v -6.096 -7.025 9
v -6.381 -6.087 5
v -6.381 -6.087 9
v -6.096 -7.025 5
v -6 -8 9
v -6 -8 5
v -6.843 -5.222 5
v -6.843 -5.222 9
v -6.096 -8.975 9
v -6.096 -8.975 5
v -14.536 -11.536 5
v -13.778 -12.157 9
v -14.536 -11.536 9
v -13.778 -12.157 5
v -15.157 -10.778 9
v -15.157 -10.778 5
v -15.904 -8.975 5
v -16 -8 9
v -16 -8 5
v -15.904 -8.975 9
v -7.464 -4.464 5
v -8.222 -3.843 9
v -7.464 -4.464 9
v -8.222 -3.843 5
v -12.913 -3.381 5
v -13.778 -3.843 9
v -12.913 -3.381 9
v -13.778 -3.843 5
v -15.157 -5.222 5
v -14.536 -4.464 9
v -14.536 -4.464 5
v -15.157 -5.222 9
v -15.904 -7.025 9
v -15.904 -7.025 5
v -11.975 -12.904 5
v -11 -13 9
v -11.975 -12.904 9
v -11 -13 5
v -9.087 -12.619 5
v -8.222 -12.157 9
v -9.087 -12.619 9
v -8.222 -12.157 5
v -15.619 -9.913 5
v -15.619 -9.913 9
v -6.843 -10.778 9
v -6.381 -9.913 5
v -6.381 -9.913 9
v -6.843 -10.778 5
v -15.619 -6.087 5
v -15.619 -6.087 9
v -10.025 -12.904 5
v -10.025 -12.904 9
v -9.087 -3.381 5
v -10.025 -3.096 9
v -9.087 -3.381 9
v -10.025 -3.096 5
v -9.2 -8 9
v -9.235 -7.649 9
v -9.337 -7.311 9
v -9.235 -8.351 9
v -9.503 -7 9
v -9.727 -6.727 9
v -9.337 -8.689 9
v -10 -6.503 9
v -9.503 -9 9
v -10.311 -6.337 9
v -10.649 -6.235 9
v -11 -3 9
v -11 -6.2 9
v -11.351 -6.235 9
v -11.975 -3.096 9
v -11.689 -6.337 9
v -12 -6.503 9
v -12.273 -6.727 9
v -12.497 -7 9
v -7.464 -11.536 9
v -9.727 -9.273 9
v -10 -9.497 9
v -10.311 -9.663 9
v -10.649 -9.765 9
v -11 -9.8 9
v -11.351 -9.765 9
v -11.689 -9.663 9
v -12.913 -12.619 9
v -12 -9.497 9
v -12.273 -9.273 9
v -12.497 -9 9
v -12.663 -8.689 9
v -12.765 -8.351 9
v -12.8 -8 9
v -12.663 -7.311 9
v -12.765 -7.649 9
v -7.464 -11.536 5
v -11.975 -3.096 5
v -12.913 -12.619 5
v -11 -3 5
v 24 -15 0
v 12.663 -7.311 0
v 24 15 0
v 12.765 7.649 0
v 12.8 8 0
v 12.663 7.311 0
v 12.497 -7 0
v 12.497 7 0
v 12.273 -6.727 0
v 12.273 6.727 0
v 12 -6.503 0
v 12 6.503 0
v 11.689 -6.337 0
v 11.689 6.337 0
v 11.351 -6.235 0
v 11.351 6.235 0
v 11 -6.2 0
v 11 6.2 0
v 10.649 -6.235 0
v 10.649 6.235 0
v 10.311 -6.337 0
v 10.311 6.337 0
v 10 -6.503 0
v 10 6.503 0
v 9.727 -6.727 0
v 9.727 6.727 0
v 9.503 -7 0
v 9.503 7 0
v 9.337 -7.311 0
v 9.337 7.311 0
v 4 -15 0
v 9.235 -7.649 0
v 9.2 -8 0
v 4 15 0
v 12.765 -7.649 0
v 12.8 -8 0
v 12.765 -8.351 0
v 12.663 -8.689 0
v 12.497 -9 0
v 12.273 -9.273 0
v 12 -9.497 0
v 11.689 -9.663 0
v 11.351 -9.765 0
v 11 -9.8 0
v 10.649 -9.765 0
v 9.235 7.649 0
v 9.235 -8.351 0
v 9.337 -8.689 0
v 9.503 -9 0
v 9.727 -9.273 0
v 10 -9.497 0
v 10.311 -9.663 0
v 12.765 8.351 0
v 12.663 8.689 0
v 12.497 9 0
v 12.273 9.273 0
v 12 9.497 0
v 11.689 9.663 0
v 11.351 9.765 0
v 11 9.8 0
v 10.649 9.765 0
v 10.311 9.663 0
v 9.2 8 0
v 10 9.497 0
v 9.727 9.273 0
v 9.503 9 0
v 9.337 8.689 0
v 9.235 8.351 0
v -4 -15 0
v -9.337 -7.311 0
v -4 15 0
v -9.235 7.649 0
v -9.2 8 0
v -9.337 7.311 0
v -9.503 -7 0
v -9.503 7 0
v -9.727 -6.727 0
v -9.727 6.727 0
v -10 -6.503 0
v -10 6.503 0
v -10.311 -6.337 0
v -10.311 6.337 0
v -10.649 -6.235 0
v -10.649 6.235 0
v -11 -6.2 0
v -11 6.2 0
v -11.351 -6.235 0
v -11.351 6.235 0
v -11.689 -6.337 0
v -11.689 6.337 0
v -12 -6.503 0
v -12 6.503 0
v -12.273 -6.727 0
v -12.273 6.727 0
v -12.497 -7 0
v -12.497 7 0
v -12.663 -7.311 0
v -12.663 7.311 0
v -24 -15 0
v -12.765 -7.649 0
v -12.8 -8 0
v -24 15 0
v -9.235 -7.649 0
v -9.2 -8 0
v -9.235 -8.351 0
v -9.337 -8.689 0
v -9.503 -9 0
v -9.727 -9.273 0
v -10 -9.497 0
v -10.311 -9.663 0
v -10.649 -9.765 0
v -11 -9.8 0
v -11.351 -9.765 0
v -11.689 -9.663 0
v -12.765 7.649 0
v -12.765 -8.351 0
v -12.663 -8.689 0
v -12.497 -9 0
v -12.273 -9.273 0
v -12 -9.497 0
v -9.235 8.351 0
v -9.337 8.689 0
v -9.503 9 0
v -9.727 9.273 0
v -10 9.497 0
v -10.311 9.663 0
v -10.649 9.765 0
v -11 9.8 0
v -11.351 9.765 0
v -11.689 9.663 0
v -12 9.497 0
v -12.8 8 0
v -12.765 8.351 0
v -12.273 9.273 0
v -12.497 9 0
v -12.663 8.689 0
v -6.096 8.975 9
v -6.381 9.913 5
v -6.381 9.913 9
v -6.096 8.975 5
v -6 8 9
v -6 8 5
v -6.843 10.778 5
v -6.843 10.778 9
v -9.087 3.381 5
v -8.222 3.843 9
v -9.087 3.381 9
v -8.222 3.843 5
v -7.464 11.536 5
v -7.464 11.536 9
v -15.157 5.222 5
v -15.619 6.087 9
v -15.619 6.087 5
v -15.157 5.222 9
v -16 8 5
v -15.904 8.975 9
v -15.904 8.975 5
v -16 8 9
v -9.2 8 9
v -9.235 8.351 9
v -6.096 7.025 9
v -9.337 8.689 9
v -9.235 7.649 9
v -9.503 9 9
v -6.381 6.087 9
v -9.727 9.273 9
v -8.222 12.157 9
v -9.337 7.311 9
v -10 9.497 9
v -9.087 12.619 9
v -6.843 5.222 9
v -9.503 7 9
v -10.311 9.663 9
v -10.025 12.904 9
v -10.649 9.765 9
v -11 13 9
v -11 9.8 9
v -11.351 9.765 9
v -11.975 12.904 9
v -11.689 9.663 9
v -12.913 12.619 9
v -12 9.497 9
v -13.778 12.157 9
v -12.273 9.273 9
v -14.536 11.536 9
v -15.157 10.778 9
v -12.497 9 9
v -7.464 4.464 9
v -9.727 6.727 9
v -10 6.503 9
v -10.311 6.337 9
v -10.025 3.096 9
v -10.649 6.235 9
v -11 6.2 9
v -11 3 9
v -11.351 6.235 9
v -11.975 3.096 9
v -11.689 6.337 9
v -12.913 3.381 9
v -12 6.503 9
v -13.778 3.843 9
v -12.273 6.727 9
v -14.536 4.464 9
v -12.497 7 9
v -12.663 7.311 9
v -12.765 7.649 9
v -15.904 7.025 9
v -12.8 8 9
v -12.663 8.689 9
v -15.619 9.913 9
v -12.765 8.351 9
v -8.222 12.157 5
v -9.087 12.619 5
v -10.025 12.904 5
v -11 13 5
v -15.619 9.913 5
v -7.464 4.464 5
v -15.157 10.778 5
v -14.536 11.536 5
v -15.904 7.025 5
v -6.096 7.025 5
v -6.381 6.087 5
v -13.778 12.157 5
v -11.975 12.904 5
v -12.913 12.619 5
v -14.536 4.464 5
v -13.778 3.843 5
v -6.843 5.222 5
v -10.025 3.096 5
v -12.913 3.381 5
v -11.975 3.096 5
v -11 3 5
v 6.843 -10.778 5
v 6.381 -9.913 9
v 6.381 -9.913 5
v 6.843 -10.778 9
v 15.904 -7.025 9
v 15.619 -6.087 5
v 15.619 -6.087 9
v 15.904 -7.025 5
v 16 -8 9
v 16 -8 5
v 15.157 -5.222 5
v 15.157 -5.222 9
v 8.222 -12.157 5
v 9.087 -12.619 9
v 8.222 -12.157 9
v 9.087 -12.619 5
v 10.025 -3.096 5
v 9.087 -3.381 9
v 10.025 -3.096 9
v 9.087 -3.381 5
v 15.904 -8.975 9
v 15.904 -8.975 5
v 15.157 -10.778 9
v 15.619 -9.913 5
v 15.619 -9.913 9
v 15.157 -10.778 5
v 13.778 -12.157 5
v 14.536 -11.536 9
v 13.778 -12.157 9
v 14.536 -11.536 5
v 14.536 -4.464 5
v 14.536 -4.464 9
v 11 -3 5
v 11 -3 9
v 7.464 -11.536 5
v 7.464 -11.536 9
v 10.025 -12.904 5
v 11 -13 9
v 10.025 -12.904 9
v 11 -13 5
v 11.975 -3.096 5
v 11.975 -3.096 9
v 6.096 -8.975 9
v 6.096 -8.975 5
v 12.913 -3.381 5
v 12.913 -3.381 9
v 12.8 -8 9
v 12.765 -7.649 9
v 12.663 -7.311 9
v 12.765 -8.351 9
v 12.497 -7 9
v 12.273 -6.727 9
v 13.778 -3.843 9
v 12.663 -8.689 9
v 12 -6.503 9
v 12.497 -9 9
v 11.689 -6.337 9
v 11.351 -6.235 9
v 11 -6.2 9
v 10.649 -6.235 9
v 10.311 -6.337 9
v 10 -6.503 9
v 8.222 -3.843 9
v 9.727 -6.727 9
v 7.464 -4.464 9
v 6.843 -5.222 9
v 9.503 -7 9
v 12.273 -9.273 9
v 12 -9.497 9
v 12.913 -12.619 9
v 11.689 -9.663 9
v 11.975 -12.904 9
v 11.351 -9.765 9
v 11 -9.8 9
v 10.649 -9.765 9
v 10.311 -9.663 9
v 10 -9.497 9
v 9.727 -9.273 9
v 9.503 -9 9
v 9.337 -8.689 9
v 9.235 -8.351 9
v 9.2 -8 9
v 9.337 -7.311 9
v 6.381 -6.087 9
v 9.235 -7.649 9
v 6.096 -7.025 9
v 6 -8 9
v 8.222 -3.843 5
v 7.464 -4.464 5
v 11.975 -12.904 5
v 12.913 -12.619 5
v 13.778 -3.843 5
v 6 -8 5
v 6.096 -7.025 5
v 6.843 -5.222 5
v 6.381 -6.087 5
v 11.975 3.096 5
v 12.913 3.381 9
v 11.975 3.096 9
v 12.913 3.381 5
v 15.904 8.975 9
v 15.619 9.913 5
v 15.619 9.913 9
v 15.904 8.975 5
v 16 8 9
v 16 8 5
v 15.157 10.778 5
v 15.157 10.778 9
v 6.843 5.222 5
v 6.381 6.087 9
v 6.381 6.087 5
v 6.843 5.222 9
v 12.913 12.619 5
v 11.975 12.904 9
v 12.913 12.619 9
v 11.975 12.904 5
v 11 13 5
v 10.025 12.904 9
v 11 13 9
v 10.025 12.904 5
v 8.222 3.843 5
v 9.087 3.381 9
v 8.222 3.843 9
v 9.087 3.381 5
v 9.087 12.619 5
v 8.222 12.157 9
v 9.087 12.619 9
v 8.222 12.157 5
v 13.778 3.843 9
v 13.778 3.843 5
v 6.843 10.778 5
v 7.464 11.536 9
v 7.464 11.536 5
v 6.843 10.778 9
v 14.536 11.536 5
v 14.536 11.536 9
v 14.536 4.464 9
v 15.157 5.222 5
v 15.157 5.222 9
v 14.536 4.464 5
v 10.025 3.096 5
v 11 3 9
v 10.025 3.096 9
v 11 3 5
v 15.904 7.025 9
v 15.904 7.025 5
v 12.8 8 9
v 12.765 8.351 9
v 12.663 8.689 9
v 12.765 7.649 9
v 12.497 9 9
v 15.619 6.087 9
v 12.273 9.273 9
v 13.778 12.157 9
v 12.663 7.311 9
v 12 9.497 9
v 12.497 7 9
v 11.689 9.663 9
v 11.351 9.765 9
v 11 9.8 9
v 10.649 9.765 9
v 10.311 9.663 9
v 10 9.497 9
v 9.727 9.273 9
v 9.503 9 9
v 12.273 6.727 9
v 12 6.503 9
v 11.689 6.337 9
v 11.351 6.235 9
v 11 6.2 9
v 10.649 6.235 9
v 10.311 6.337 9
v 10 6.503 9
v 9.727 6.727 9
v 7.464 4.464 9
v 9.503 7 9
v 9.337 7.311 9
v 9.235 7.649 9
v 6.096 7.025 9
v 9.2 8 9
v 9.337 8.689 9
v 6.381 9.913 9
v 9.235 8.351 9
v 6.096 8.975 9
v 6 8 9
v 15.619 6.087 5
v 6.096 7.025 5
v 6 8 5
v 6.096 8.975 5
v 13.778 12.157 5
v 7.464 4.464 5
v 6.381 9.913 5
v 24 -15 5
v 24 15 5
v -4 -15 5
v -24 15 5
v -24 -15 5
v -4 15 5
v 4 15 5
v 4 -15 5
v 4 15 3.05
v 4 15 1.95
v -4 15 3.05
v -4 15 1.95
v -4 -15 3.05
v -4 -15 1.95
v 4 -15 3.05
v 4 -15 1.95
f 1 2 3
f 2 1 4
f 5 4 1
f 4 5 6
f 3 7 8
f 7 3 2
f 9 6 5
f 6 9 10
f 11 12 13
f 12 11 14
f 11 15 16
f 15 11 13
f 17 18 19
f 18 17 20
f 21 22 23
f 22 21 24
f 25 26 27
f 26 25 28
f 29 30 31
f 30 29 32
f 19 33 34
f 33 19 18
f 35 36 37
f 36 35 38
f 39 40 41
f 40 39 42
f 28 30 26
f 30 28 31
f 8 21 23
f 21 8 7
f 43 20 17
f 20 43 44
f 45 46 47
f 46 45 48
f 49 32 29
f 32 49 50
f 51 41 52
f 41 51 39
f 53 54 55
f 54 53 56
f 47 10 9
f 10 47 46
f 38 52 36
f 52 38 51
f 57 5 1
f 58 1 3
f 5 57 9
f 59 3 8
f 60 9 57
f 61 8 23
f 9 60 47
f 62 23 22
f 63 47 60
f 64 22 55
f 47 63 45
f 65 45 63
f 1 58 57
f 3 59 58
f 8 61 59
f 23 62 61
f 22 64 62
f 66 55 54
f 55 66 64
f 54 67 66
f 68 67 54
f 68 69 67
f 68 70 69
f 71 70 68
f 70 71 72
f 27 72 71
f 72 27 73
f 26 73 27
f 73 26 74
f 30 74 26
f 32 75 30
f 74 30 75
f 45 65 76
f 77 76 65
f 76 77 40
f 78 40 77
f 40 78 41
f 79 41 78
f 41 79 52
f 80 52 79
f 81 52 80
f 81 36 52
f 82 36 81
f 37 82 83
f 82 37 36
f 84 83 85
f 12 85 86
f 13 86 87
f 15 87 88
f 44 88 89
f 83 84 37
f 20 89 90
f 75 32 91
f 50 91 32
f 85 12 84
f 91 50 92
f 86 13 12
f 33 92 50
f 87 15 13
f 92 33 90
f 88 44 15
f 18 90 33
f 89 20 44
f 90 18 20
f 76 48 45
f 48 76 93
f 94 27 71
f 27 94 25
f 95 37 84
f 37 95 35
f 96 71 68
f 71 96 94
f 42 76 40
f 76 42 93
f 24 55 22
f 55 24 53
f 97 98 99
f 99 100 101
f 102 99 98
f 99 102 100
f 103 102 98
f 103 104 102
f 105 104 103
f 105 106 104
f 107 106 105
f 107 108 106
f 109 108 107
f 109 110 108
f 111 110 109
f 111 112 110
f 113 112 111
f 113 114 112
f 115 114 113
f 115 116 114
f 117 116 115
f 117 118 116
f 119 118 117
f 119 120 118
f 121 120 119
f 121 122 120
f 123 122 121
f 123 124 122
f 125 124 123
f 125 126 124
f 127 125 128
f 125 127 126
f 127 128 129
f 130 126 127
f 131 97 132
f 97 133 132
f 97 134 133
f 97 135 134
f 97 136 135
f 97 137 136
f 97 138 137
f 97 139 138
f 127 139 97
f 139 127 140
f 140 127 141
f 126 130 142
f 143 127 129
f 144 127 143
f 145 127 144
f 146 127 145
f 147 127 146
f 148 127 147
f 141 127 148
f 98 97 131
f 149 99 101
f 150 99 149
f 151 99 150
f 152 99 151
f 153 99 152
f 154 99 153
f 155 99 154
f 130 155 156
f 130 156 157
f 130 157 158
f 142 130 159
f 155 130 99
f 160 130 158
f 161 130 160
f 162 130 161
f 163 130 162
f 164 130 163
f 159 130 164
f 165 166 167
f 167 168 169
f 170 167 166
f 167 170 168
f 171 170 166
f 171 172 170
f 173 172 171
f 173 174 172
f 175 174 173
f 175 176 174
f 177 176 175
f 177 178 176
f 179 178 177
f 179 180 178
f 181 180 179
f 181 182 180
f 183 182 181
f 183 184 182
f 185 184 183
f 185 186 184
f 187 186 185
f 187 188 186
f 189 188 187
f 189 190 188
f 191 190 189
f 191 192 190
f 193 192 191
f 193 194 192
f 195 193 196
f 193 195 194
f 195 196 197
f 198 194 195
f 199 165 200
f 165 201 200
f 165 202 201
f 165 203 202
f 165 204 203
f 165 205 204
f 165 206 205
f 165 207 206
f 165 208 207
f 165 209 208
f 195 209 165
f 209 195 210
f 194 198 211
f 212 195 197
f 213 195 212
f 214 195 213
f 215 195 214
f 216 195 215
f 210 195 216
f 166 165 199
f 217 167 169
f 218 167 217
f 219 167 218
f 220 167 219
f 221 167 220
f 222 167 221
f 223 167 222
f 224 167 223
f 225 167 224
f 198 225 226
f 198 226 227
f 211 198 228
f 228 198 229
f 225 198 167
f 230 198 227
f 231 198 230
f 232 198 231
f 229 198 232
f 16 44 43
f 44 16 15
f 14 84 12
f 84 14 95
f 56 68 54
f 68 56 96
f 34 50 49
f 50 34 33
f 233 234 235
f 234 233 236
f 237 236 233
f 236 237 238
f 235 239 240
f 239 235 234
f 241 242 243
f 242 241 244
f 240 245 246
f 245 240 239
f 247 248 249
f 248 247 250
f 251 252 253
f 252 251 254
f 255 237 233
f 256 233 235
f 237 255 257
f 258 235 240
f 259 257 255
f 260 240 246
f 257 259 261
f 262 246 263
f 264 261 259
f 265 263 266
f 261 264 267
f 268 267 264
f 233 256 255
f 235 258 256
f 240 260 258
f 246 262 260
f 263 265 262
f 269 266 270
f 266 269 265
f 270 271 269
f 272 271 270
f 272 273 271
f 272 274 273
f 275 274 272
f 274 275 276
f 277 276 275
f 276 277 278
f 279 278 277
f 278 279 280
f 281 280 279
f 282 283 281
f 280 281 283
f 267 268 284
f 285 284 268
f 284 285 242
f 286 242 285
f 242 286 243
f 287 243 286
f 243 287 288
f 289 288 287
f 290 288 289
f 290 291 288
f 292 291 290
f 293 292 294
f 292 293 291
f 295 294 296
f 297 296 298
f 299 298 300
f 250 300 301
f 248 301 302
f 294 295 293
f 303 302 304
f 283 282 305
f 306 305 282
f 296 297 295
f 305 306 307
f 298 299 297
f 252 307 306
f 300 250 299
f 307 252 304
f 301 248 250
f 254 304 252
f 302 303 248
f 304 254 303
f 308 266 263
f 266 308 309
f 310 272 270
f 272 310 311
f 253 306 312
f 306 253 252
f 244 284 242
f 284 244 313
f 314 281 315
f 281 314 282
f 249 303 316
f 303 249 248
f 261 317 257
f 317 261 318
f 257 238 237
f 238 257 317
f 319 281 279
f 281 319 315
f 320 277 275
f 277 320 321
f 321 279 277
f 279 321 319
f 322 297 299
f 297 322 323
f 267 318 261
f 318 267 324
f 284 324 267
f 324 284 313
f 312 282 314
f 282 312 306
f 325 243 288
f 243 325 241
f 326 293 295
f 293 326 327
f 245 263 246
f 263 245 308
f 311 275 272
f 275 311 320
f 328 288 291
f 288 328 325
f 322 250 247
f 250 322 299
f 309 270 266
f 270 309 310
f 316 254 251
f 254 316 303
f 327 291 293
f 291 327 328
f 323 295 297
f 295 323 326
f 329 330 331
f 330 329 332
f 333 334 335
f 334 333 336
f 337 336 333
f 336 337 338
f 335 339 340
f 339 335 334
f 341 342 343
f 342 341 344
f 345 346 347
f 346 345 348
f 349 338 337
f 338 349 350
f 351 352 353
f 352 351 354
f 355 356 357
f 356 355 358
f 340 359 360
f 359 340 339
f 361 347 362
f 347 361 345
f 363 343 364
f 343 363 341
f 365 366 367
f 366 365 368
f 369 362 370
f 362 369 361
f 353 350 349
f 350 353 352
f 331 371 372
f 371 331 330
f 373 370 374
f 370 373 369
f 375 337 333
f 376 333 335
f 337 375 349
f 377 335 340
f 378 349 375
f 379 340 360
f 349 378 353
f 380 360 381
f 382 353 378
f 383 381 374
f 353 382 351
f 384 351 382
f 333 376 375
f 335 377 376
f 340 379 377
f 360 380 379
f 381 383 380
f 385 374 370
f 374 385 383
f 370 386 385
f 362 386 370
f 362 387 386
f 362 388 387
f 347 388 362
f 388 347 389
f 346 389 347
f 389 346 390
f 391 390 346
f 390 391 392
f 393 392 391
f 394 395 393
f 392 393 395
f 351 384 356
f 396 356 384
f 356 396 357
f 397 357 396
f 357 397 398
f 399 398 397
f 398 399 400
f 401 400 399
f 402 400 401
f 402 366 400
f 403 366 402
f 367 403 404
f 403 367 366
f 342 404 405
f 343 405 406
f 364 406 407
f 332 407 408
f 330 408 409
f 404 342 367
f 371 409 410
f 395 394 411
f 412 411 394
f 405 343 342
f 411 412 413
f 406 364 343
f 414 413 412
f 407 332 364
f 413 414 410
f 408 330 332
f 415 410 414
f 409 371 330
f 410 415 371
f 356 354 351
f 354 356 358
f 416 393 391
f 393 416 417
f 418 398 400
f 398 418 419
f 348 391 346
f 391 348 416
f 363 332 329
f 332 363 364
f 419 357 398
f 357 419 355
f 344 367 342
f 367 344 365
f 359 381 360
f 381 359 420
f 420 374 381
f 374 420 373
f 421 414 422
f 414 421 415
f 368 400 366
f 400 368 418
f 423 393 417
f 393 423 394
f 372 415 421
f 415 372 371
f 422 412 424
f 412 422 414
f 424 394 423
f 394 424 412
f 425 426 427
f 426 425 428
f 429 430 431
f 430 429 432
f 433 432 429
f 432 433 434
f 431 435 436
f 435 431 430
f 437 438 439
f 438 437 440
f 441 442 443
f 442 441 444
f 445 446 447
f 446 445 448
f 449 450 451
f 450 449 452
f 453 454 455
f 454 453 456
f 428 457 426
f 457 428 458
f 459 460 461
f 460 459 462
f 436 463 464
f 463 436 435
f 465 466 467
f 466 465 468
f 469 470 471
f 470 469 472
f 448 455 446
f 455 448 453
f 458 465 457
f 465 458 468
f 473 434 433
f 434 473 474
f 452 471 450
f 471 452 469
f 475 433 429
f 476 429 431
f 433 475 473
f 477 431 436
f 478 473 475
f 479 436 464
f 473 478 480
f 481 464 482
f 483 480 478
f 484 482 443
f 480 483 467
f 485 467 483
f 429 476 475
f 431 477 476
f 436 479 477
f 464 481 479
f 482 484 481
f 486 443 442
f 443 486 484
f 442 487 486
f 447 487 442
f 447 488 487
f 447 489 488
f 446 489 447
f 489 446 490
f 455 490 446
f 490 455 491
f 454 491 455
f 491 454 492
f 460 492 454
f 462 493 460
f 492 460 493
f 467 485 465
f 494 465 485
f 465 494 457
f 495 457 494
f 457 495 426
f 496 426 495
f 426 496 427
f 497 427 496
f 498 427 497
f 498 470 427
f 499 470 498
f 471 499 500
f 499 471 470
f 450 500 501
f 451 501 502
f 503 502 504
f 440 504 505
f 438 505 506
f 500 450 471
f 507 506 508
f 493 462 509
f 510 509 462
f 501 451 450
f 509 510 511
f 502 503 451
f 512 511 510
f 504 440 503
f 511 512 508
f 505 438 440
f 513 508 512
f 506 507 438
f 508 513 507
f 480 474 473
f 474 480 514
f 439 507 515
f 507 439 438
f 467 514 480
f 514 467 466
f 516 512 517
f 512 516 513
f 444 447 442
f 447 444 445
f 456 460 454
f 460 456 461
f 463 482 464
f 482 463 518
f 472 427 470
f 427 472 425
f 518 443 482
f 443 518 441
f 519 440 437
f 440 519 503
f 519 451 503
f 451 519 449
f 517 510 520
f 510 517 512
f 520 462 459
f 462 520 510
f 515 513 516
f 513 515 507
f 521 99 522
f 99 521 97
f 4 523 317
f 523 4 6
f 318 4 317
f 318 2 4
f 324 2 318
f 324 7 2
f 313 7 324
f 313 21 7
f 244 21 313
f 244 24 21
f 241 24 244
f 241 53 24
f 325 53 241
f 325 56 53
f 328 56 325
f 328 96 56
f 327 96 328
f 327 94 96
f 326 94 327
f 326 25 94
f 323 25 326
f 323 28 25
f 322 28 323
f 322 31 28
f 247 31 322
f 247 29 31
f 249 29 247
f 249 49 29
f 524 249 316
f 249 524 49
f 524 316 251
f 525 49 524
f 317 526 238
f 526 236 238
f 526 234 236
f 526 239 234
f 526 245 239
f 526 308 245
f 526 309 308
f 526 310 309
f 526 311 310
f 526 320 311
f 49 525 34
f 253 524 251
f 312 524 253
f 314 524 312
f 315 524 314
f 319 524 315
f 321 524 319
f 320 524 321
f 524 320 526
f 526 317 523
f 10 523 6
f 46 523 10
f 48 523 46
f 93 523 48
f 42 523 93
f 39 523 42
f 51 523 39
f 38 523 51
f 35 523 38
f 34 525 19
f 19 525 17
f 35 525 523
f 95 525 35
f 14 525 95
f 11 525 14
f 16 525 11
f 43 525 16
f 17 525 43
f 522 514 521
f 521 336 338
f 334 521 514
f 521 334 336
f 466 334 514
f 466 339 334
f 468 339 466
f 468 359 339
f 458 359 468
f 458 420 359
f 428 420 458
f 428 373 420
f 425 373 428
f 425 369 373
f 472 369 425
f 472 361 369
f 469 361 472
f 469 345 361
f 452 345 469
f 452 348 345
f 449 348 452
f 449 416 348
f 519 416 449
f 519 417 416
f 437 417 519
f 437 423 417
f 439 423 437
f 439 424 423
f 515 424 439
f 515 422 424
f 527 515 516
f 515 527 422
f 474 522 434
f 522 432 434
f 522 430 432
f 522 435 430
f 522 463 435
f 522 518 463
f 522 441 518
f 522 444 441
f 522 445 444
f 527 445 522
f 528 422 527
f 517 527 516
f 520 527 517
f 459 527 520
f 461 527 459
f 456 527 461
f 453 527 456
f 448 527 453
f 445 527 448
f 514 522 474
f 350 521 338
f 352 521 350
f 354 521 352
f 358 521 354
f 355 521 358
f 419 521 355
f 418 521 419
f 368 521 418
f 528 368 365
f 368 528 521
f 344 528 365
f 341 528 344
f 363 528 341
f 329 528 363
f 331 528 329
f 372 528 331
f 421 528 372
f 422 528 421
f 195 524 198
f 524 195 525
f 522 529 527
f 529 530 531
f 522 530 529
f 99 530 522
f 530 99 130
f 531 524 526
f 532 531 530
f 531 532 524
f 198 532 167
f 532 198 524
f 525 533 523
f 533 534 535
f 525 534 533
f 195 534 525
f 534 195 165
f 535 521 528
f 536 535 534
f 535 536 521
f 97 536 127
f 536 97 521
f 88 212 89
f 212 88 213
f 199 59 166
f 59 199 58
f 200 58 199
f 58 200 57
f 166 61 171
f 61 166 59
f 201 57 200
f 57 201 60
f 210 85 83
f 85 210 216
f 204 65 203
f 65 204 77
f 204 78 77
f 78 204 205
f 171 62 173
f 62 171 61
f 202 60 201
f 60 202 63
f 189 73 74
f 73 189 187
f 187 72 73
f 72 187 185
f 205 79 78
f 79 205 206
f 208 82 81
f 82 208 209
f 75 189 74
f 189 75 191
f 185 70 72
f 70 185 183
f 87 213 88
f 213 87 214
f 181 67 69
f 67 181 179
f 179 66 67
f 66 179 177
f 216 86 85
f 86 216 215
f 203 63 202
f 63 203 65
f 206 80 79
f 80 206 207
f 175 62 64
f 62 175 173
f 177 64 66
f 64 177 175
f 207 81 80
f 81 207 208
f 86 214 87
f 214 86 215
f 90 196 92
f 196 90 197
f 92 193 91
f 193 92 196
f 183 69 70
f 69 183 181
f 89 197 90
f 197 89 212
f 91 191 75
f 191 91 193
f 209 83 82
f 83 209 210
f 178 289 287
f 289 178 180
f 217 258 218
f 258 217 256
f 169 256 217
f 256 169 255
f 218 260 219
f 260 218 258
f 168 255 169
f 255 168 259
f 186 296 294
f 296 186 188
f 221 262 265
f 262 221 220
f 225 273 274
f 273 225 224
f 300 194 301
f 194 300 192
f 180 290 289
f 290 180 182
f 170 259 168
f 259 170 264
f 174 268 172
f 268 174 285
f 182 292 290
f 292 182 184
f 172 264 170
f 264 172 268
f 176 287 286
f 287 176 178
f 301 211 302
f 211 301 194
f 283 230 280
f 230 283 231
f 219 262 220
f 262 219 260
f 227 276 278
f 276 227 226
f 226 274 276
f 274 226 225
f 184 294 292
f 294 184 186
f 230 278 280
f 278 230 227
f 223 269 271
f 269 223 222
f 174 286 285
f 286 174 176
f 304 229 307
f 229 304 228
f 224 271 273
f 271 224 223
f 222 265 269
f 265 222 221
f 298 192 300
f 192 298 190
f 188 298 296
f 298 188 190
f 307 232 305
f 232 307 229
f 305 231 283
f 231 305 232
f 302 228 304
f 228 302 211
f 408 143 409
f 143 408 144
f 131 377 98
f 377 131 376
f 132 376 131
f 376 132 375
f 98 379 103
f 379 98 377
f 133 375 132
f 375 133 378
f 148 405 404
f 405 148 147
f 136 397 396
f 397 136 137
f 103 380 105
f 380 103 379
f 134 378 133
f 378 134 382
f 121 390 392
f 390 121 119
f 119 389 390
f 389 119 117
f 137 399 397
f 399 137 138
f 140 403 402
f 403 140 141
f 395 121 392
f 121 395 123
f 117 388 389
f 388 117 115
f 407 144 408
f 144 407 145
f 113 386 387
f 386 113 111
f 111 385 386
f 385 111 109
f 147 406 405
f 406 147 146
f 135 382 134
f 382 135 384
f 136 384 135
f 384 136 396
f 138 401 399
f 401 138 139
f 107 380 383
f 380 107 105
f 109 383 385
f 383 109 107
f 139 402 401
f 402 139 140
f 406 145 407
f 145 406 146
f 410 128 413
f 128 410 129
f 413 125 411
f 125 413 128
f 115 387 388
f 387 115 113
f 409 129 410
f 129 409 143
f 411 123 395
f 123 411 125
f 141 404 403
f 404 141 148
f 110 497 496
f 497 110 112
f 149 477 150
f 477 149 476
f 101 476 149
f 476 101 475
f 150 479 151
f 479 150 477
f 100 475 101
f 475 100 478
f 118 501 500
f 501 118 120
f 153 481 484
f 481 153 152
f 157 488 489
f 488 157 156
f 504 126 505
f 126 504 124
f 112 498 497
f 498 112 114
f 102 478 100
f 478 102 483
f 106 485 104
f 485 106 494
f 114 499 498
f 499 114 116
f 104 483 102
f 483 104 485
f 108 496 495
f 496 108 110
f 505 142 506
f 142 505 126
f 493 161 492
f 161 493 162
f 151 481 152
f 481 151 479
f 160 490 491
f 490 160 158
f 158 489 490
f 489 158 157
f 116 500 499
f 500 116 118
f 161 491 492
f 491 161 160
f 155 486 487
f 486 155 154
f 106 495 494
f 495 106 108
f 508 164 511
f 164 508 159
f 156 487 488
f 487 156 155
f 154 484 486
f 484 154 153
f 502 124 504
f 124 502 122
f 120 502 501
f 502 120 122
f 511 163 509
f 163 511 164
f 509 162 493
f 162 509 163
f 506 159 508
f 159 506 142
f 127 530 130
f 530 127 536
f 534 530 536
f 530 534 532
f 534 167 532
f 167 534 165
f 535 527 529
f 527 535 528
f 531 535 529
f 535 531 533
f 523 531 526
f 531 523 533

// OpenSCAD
$fn = 32;

// ----------------------------------------------------------------------
// Living hinge: 48 x 30 mm plates, 1.1 mm flexible web
// ----------------------------------------------------------------------

// --- parameters (mm) ---
plate_len = 20;           // plate length outside the web
plate_w = 30;             // plate width
thick = 5;                // plate thickness
web_half = 4;             // half width of the flex band
web_t = 1.1;              // flexible web thickness
web_z = 1.95;             // web position inside the thickness
boss_d = 10;              // screw boss diameter
boss_h = 9;               // screw boss height
boss_x = 11;              // screw boss distance from the web
screw_d = 3.6;            // screw hole

difference() {
  union() {
    /* one flat strip, later thinned at the middle */
    translate([-24, -15, 0]) cube([48, 30, 5]);
    /* screw bosses, sunk 0.5 mm into the plates */
    for (sx = [-11, 11]) {
      for (sy = [-8, 8]) {
        translate([sx, sy, 0]) cylinder(h = boss_h, d = boss_d);
      }
    }
  }
  /* channel from below: leaves the web on top of it */
  translate([-4, -17.5, -2.5]) cube([8, 35, 4.45]);
  /* channel from above: thins the web down to web_t */
  translate([-4, -17.5, 3.05]) cube([8, 35, 4.45]);
  /* screw holes through the bosses */
  for (sx = [-11, 11]) {
    for (sy = [-8, 8]) {
      translate([sx, sy, -2.5]) cylinder(h = boss_h + 5, d = screw_d);
    }
  }
}
